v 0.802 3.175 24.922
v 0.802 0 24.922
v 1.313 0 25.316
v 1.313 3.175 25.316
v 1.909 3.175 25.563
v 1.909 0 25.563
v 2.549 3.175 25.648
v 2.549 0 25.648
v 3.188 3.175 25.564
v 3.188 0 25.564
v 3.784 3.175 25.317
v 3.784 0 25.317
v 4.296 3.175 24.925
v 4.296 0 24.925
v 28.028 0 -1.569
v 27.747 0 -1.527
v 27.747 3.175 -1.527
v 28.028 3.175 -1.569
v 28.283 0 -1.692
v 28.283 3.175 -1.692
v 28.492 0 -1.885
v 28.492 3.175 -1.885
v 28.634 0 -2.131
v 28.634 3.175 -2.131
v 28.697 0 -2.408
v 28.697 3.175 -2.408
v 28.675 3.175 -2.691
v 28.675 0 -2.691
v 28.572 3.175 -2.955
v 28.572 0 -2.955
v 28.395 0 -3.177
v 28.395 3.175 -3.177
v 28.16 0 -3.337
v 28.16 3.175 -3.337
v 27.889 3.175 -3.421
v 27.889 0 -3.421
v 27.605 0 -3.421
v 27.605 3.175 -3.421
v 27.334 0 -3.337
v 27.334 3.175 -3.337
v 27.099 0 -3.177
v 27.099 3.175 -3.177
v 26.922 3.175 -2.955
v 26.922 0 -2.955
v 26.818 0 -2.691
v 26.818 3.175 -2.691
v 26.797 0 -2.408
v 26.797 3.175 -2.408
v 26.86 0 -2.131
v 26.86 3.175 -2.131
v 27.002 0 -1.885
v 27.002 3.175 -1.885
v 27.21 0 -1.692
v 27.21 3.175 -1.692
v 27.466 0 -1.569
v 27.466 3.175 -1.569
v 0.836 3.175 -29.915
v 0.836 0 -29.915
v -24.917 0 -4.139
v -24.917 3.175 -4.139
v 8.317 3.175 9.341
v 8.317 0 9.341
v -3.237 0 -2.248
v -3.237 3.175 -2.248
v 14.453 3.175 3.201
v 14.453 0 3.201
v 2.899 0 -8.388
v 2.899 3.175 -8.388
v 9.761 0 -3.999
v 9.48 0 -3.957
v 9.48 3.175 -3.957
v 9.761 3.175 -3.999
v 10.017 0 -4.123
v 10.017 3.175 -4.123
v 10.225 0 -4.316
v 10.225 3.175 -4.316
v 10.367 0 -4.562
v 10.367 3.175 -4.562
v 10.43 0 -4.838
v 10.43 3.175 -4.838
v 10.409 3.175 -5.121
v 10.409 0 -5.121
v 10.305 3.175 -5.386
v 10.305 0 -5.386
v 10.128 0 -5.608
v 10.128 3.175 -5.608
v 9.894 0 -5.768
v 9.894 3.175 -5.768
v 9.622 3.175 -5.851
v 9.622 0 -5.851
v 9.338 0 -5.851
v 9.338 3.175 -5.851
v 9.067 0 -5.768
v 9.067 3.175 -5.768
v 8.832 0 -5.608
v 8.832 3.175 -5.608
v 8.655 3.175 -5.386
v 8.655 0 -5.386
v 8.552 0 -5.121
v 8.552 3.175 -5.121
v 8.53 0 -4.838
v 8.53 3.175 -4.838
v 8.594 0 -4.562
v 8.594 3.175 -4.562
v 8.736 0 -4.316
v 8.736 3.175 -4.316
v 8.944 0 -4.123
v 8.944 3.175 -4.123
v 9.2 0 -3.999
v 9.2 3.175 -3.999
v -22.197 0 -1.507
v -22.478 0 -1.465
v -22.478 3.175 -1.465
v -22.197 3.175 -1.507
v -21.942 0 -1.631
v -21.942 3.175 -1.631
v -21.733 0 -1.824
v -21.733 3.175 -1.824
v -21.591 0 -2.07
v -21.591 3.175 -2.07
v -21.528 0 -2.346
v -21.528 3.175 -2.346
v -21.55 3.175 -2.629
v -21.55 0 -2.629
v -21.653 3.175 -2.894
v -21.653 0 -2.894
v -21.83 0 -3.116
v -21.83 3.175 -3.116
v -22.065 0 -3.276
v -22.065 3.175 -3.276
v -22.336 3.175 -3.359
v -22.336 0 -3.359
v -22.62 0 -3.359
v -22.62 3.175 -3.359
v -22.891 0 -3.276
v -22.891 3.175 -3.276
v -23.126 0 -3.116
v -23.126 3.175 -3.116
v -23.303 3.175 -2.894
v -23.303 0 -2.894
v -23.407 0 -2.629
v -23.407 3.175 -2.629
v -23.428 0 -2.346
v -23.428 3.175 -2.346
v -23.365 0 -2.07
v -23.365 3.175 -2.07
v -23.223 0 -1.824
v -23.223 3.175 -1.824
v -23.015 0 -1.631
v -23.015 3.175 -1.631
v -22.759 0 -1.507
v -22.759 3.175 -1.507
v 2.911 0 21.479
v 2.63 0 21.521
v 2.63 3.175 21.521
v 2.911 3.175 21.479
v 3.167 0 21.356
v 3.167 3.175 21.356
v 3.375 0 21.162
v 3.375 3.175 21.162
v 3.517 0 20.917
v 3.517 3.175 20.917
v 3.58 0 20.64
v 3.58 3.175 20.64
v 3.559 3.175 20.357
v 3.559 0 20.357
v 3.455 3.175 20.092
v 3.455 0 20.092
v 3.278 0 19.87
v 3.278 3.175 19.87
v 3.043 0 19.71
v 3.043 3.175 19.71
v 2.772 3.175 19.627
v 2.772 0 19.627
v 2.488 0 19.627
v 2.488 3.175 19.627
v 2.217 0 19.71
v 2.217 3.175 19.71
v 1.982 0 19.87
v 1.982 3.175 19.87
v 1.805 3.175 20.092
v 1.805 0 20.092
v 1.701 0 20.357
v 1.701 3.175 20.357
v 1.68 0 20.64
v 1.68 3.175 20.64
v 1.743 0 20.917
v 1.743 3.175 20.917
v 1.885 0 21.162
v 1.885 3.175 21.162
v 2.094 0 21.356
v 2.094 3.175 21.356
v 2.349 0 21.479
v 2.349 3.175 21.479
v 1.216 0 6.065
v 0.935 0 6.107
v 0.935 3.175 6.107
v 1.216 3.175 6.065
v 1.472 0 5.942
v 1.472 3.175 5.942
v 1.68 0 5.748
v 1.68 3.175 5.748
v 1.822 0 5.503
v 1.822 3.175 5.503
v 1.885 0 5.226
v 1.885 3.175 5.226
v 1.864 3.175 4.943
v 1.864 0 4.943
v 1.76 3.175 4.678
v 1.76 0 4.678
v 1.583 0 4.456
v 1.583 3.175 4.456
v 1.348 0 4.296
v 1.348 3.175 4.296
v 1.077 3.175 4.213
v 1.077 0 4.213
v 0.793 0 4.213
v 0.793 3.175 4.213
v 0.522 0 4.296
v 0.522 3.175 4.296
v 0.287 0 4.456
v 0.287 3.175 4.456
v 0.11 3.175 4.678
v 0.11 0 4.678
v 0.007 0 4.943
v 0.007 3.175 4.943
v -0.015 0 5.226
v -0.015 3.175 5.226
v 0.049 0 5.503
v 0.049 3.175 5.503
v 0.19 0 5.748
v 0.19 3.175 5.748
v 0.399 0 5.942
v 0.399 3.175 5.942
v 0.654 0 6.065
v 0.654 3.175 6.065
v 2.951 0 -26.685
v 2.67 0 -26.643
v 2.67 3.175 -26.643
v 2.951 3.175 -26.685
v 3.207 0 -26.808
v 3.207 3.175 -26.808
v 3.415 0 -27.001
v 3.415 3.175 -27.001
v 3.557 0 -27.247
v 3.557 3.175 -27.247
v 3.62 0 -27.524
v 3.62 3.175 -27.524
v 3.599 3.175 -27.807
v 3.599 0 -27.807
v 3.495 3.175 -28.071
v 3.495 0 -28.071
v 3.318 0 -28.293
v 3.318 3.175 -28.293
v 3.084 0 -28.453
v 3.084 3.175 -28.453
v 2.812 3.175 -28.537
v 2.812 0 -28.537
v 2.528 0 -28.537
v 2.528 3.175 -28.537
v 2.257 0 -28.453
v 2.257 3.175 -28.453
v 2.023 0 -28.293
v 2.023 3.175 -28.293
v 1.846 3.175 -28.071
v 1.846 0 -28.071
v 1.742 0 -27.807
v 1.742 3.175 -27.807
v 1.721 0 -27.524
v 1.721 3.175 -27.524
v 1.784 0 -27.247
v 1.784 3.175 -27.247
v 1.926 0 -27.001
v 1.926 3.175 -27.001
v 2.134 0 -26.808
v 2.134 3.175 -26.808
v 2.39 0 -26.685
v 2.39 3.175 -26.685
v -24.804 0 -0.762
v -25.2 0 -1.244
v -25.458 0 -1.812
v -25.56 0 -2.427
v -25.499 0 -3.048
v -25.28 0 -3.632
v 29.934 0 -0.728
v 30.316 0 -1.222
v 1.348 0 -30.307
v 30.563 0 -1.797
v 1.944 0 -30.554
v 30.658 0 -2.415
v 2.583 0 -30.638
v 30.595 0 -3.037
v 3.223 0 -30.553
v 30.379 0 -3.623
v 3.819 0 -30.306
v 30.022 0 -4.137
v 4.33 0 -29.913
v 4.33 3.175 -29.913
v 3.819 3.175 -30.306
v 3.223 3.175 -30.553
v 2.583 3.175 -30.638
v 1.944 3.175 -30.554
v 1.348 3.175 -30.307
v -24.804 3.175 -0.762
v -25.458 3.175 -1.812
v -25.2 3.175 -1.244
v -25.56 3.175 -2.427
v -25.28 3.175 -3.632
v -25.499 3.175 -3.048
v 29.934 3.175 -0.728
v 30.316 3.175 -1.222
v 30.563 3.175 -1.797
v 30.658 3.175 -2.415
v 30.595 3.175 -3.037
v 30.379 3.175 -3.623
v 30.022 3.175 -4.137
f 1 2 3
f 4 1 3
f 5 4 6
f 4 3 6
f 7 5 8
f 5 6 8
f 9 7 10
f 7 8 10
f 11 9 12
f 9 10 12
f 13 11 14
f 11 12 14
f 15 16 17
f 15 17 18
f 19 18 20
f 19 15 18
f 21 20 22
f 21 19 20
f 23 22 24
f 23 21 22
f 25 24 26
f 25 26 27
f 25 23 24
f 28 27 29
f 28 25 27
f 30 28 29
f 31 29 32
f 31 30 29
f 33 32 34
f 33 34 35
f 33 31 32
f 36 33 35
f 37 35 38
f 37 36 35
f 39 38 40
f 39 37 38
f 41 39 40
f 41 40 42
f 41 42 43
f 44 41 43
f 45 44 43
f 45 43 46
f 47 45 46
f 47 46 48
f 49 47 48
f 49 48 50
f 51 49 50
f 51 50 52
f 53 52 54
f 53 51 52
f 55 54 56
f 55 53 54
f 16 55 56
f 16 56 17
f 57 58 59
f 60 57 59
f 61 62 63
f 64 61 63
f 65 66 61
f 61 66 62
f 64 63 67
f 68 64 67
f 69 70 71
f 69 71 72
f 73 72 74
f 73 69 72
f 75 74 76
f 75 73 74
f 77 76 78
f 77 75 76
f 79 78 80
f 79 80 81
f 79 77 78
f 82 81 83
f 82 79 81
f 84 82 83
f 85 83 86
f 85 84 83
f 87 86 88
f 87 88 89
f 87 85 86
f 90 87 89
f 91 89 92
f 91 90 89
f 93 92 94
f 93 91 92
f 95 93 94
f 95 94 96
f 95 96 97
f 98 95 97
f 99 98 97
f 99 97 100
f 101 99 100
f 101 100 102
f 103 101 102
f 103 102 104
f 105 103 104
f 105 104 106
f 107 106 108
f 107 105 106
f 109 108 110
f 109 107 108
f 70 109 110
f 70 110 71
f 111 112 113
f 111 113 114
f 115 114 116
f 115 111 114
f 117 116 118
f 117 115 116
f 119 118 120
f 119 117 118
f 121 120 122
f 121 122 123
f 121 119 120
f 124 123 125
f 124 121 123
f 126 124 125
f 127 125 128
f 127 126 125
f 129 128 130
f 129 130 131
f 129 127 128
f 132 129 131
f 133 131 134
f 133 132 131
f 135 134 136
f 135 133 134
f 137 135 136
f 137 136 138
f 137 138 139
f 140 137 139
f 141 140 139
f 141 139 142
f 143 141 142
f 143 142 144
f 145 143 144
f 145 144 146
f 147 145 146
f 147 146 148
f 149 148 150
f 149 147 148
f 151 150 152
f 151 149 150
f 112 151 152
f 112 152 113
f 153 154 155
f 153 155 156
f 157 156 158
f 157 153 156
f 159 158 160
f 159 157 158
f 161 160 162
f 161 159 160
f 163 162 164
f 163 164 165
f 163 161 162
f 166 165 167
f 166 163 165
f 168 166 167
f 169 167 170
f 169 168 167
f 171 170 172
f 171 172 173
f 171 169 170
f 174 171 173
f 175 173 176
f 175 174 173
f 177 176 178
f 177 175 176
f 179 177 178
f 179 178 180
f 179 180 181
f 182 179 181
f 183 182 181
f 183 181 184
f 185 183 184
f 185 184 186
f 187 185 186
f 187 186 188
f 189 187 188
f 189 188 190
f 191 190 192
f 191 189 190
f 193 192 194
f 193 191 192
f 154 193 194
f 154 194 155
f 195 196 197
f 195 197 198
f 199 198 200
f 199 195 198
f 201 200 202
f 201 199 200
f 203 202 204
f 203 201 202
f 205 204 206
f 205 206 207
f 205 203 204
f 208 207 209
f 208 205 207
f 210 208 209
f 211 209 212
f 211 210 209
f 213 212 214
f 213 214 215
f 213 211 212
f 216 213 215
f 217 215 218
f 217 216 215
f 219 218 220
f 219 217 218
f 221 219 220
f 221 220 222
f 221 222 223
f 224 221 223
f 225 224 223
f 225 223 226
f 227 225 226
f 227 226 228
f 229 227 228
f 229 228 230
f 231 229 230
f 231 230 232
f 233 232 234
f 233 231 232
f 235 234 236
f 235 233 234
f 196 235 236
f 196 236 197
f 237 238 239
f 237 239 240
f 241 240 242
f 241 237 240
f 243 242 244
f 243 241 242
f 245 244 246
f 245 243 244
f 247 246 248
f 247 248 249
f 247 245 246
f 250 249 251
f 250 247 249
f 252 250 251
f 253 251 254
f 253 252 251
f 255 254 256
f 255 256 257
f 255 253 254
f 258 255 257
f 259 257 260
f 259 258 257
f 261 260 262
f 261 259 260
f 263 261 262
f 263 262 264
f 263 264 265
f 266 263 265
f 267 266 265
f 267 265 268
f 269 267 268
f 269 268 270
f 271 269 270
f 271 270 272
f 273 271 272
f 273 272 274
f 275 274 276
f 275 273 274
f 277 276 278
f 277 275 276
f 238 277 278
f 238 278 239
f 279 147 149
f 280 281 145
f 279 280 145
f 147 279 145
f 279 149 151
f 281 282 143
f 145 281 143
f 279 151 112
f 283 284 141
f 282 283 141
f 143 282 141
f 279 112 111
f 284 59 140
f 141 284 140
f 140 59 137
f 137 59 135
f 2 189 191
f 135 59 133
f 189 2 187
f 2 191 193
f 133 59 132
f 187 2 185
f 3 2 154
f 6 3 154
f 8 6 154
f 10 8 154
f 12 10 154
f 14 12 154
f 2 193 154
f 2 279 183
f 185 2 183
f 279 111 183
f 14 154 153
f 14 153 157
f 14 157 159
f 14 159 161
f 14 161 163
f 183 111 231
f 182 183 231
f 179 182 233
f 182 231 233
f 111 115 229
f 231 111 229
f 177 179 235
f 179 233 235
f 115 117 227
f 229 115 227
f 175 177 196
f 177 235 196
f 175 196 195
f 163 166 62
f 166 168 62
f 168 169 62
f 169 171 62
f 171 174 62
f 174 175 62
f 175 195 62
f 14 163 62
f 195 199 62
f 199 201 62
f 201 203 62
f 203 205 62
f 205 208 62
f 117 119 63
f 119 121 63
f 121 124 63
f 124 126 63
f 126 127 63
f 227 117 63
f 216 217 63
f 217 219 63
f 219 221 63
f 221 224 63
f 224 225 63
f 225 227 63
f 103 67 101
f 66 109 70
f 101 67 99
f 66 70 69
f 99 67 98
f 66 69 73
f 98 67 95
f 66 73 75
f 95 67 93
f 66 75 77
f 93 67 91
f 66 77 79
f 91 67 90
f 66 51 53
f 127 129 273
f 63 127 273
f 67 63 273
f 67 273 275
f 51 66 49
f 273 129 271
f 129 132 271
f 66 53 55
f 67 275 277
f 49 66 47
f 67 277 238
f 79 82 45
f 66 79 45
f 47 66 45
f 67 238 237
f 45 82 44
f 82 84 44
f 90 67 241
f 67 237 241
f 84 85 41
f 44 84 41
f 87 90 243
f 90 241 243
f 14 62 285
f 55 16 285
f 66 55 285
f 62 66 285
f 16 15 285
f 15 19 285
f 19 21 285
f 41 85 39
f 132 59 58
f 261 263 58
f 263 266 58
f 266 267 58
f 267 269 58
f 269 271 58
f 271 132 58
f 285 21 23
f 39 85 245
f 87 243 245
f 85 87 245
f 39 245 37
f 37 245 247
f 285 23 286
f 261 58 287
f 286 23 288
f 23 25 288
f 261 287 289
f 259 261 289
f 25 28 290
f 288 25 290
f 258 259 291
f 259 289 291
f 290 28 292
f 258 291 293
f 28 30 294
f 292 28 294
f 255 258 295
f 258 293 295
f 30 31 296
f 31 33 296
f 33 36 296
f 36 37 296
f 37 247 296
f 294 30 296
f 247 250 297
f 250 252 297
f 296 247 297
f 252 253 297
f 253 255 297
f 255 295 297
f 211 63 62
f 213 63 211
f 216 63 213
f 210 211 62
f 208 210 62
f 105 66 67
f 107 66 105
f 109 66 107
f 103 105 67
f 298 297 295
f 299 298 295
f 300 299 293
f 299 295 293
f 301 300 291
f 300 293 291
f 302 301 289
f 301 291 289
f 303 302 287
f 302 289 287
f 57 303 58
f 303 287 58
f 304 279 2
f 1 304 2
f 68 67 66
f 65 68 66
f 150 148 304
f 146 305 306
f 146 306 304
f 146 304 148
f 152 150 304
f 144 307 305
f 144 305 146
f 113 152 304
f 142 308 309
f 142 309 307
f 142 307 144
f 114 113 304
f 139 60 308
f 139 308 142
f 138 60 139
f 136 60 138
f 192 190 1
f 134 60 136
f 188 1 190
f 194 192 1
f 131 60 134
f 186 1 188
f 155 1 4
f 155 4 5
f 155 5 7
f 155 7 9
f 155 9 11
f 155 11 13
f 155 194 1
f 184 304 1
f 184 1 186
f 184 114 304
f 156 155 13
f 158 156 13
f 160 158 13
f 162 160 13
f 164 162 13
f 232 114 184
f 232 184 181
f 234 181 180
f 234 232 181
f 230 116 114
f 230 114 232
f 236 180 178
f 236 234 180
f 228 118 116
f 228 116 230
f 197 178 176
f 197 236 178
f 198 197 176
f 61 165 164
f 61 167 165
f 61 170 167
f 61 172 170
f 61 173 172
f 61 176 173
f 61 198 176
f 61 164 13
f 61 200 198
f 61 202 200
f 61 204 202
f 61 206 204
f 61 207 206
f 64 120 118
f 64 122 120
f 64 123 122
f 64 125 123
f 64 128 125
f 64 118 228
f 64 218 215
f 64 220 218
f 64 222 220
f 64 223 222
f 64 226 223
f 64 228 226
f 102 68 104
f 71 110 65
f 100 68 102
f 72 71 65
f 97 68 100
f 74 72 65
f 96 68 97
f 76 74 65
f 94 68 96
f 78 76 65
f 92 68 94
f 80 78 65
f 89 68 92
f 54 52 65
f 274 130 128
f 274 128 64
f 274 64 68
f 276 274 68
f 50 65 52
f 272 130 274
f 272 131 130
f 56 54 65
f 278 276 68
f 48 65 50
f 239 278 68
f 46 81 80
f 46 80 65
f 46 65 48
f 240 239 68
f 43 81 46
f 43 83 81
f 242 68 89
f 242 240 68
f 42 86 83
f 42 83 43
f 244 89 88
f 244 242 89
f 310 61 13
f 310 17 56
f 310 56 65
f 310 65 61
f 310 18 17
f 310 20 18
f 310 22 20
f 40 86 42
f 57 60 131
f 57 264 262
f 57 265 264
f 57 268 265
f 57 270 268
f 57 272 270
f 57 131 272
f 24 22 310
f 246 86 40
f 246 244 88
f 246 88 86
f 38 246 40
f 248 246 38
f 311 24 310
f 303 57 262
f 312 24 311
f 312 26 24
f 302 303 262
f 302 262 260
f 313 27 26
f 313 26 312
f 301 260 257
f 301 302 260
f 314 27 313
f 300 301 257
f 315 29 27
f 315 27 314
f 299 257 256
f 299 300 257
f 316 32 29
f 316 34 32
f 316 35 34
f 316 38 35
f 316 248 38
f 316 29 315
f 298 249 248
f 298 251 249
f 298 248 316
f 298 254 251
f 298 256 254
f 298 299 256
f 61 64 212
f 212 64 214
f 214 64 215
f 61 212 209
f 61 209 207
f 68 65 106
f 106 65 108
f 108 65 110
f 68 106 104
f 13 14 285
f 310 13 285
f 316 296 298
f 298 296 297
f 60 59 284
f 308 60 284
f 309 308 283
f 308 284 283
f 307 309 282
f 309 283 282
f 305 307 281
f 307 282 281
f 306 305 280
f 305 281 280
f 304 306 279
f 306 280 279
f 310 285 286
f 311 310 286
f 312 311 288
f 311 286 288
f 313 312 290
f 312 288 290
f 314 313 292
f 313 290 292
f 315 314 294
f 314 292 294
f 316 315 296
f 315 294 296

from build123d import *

# Parameters (mm, degrees)
SKETCH1_R           = 0.9525
BOSS_EXTRUDE1_DEPTH = 3.175


with BuildPart() as part:
    # Sketch1 → Boss-Extrude1 (new body)
    with BuildSketch(Plane(origin=(0, 0, 0), x_dir=(1, 0, 0), z_dir=(0, 1, 0))):
        with BuildLine():
            Line((0.836079848, 29.914691197), (-24.916908158, 4.139124102))
            ThreePointArc((-24.916908158, 4.139124102), (-25.559946724, 2.427169764), (-24.804168658, 0.761911295))
            Line((-24.804168658, 0.761911295), (0.802012418, -24.922477694))
            ThreePointArc((0.802012418, -24.922477694), (2.548586816, -25.648126247), (4.296057395, -24.924638497))
            Line((4.296057395, -24.924638497), (29.933843676, 0.727916893))
            ThreePointArc((29.933843676, 0.727916893), (30.658077132, 2.414753754), (30.022424716, 4.136926421))
            Line((30.022424716, 4.136926421), (4.329842419, 29.912525833))
            ThreePointArc((4.329842419, 29.912525833), (2.583410169, 30.638116576), (0.836079848, 29.914691197))
        make_face()
        with Locations(Location((2.67042066, 27.595082687, 0), (0, 0, 270))):
            Circle(SKETCH1_R, mode=Mode.SUBTRACT)
        with Locations(Location((-22.478149371, 2.417496952, 0), (0, 0, 270))):
            Circle(SKETCH1_R, mode=Mode.SUBTRACT)
        with Locations(Location((0.935185954, -5.154528514, 0), (0, 0, 270))):
            Circle(SKETCH1_R, mode=Mode.SUBTRACT)
        with Locations(Location((9.48030204, 4.90951313, 0), (0, 0, 270))):
            Circle(SKETCH1_R, mode=Mode.SUBTRACT)
        with Locations(Location((2.63009313, -20.568546616, 0), (0, 0, 270))):
            Circle(SKETCH1_R, mode=Mode.SUBTRACT)
        with Locations(Location((27.74686367, 2.479102218, 0), (0, 0, 270))):
            Circle(SKETCH1_R, mode=Mode.SUBTRACT)
        Polygon((8.316988679, -9.340962636), (-3.236630252, 2.247942235), (2.899230919, 8.38767289), (14.452988692, -3.201371075), align=None, mode=Mode.SUBTRACT)
    extrude(amount=BOSS_EXTRUDE1_DEPTH)


solid = part.part
